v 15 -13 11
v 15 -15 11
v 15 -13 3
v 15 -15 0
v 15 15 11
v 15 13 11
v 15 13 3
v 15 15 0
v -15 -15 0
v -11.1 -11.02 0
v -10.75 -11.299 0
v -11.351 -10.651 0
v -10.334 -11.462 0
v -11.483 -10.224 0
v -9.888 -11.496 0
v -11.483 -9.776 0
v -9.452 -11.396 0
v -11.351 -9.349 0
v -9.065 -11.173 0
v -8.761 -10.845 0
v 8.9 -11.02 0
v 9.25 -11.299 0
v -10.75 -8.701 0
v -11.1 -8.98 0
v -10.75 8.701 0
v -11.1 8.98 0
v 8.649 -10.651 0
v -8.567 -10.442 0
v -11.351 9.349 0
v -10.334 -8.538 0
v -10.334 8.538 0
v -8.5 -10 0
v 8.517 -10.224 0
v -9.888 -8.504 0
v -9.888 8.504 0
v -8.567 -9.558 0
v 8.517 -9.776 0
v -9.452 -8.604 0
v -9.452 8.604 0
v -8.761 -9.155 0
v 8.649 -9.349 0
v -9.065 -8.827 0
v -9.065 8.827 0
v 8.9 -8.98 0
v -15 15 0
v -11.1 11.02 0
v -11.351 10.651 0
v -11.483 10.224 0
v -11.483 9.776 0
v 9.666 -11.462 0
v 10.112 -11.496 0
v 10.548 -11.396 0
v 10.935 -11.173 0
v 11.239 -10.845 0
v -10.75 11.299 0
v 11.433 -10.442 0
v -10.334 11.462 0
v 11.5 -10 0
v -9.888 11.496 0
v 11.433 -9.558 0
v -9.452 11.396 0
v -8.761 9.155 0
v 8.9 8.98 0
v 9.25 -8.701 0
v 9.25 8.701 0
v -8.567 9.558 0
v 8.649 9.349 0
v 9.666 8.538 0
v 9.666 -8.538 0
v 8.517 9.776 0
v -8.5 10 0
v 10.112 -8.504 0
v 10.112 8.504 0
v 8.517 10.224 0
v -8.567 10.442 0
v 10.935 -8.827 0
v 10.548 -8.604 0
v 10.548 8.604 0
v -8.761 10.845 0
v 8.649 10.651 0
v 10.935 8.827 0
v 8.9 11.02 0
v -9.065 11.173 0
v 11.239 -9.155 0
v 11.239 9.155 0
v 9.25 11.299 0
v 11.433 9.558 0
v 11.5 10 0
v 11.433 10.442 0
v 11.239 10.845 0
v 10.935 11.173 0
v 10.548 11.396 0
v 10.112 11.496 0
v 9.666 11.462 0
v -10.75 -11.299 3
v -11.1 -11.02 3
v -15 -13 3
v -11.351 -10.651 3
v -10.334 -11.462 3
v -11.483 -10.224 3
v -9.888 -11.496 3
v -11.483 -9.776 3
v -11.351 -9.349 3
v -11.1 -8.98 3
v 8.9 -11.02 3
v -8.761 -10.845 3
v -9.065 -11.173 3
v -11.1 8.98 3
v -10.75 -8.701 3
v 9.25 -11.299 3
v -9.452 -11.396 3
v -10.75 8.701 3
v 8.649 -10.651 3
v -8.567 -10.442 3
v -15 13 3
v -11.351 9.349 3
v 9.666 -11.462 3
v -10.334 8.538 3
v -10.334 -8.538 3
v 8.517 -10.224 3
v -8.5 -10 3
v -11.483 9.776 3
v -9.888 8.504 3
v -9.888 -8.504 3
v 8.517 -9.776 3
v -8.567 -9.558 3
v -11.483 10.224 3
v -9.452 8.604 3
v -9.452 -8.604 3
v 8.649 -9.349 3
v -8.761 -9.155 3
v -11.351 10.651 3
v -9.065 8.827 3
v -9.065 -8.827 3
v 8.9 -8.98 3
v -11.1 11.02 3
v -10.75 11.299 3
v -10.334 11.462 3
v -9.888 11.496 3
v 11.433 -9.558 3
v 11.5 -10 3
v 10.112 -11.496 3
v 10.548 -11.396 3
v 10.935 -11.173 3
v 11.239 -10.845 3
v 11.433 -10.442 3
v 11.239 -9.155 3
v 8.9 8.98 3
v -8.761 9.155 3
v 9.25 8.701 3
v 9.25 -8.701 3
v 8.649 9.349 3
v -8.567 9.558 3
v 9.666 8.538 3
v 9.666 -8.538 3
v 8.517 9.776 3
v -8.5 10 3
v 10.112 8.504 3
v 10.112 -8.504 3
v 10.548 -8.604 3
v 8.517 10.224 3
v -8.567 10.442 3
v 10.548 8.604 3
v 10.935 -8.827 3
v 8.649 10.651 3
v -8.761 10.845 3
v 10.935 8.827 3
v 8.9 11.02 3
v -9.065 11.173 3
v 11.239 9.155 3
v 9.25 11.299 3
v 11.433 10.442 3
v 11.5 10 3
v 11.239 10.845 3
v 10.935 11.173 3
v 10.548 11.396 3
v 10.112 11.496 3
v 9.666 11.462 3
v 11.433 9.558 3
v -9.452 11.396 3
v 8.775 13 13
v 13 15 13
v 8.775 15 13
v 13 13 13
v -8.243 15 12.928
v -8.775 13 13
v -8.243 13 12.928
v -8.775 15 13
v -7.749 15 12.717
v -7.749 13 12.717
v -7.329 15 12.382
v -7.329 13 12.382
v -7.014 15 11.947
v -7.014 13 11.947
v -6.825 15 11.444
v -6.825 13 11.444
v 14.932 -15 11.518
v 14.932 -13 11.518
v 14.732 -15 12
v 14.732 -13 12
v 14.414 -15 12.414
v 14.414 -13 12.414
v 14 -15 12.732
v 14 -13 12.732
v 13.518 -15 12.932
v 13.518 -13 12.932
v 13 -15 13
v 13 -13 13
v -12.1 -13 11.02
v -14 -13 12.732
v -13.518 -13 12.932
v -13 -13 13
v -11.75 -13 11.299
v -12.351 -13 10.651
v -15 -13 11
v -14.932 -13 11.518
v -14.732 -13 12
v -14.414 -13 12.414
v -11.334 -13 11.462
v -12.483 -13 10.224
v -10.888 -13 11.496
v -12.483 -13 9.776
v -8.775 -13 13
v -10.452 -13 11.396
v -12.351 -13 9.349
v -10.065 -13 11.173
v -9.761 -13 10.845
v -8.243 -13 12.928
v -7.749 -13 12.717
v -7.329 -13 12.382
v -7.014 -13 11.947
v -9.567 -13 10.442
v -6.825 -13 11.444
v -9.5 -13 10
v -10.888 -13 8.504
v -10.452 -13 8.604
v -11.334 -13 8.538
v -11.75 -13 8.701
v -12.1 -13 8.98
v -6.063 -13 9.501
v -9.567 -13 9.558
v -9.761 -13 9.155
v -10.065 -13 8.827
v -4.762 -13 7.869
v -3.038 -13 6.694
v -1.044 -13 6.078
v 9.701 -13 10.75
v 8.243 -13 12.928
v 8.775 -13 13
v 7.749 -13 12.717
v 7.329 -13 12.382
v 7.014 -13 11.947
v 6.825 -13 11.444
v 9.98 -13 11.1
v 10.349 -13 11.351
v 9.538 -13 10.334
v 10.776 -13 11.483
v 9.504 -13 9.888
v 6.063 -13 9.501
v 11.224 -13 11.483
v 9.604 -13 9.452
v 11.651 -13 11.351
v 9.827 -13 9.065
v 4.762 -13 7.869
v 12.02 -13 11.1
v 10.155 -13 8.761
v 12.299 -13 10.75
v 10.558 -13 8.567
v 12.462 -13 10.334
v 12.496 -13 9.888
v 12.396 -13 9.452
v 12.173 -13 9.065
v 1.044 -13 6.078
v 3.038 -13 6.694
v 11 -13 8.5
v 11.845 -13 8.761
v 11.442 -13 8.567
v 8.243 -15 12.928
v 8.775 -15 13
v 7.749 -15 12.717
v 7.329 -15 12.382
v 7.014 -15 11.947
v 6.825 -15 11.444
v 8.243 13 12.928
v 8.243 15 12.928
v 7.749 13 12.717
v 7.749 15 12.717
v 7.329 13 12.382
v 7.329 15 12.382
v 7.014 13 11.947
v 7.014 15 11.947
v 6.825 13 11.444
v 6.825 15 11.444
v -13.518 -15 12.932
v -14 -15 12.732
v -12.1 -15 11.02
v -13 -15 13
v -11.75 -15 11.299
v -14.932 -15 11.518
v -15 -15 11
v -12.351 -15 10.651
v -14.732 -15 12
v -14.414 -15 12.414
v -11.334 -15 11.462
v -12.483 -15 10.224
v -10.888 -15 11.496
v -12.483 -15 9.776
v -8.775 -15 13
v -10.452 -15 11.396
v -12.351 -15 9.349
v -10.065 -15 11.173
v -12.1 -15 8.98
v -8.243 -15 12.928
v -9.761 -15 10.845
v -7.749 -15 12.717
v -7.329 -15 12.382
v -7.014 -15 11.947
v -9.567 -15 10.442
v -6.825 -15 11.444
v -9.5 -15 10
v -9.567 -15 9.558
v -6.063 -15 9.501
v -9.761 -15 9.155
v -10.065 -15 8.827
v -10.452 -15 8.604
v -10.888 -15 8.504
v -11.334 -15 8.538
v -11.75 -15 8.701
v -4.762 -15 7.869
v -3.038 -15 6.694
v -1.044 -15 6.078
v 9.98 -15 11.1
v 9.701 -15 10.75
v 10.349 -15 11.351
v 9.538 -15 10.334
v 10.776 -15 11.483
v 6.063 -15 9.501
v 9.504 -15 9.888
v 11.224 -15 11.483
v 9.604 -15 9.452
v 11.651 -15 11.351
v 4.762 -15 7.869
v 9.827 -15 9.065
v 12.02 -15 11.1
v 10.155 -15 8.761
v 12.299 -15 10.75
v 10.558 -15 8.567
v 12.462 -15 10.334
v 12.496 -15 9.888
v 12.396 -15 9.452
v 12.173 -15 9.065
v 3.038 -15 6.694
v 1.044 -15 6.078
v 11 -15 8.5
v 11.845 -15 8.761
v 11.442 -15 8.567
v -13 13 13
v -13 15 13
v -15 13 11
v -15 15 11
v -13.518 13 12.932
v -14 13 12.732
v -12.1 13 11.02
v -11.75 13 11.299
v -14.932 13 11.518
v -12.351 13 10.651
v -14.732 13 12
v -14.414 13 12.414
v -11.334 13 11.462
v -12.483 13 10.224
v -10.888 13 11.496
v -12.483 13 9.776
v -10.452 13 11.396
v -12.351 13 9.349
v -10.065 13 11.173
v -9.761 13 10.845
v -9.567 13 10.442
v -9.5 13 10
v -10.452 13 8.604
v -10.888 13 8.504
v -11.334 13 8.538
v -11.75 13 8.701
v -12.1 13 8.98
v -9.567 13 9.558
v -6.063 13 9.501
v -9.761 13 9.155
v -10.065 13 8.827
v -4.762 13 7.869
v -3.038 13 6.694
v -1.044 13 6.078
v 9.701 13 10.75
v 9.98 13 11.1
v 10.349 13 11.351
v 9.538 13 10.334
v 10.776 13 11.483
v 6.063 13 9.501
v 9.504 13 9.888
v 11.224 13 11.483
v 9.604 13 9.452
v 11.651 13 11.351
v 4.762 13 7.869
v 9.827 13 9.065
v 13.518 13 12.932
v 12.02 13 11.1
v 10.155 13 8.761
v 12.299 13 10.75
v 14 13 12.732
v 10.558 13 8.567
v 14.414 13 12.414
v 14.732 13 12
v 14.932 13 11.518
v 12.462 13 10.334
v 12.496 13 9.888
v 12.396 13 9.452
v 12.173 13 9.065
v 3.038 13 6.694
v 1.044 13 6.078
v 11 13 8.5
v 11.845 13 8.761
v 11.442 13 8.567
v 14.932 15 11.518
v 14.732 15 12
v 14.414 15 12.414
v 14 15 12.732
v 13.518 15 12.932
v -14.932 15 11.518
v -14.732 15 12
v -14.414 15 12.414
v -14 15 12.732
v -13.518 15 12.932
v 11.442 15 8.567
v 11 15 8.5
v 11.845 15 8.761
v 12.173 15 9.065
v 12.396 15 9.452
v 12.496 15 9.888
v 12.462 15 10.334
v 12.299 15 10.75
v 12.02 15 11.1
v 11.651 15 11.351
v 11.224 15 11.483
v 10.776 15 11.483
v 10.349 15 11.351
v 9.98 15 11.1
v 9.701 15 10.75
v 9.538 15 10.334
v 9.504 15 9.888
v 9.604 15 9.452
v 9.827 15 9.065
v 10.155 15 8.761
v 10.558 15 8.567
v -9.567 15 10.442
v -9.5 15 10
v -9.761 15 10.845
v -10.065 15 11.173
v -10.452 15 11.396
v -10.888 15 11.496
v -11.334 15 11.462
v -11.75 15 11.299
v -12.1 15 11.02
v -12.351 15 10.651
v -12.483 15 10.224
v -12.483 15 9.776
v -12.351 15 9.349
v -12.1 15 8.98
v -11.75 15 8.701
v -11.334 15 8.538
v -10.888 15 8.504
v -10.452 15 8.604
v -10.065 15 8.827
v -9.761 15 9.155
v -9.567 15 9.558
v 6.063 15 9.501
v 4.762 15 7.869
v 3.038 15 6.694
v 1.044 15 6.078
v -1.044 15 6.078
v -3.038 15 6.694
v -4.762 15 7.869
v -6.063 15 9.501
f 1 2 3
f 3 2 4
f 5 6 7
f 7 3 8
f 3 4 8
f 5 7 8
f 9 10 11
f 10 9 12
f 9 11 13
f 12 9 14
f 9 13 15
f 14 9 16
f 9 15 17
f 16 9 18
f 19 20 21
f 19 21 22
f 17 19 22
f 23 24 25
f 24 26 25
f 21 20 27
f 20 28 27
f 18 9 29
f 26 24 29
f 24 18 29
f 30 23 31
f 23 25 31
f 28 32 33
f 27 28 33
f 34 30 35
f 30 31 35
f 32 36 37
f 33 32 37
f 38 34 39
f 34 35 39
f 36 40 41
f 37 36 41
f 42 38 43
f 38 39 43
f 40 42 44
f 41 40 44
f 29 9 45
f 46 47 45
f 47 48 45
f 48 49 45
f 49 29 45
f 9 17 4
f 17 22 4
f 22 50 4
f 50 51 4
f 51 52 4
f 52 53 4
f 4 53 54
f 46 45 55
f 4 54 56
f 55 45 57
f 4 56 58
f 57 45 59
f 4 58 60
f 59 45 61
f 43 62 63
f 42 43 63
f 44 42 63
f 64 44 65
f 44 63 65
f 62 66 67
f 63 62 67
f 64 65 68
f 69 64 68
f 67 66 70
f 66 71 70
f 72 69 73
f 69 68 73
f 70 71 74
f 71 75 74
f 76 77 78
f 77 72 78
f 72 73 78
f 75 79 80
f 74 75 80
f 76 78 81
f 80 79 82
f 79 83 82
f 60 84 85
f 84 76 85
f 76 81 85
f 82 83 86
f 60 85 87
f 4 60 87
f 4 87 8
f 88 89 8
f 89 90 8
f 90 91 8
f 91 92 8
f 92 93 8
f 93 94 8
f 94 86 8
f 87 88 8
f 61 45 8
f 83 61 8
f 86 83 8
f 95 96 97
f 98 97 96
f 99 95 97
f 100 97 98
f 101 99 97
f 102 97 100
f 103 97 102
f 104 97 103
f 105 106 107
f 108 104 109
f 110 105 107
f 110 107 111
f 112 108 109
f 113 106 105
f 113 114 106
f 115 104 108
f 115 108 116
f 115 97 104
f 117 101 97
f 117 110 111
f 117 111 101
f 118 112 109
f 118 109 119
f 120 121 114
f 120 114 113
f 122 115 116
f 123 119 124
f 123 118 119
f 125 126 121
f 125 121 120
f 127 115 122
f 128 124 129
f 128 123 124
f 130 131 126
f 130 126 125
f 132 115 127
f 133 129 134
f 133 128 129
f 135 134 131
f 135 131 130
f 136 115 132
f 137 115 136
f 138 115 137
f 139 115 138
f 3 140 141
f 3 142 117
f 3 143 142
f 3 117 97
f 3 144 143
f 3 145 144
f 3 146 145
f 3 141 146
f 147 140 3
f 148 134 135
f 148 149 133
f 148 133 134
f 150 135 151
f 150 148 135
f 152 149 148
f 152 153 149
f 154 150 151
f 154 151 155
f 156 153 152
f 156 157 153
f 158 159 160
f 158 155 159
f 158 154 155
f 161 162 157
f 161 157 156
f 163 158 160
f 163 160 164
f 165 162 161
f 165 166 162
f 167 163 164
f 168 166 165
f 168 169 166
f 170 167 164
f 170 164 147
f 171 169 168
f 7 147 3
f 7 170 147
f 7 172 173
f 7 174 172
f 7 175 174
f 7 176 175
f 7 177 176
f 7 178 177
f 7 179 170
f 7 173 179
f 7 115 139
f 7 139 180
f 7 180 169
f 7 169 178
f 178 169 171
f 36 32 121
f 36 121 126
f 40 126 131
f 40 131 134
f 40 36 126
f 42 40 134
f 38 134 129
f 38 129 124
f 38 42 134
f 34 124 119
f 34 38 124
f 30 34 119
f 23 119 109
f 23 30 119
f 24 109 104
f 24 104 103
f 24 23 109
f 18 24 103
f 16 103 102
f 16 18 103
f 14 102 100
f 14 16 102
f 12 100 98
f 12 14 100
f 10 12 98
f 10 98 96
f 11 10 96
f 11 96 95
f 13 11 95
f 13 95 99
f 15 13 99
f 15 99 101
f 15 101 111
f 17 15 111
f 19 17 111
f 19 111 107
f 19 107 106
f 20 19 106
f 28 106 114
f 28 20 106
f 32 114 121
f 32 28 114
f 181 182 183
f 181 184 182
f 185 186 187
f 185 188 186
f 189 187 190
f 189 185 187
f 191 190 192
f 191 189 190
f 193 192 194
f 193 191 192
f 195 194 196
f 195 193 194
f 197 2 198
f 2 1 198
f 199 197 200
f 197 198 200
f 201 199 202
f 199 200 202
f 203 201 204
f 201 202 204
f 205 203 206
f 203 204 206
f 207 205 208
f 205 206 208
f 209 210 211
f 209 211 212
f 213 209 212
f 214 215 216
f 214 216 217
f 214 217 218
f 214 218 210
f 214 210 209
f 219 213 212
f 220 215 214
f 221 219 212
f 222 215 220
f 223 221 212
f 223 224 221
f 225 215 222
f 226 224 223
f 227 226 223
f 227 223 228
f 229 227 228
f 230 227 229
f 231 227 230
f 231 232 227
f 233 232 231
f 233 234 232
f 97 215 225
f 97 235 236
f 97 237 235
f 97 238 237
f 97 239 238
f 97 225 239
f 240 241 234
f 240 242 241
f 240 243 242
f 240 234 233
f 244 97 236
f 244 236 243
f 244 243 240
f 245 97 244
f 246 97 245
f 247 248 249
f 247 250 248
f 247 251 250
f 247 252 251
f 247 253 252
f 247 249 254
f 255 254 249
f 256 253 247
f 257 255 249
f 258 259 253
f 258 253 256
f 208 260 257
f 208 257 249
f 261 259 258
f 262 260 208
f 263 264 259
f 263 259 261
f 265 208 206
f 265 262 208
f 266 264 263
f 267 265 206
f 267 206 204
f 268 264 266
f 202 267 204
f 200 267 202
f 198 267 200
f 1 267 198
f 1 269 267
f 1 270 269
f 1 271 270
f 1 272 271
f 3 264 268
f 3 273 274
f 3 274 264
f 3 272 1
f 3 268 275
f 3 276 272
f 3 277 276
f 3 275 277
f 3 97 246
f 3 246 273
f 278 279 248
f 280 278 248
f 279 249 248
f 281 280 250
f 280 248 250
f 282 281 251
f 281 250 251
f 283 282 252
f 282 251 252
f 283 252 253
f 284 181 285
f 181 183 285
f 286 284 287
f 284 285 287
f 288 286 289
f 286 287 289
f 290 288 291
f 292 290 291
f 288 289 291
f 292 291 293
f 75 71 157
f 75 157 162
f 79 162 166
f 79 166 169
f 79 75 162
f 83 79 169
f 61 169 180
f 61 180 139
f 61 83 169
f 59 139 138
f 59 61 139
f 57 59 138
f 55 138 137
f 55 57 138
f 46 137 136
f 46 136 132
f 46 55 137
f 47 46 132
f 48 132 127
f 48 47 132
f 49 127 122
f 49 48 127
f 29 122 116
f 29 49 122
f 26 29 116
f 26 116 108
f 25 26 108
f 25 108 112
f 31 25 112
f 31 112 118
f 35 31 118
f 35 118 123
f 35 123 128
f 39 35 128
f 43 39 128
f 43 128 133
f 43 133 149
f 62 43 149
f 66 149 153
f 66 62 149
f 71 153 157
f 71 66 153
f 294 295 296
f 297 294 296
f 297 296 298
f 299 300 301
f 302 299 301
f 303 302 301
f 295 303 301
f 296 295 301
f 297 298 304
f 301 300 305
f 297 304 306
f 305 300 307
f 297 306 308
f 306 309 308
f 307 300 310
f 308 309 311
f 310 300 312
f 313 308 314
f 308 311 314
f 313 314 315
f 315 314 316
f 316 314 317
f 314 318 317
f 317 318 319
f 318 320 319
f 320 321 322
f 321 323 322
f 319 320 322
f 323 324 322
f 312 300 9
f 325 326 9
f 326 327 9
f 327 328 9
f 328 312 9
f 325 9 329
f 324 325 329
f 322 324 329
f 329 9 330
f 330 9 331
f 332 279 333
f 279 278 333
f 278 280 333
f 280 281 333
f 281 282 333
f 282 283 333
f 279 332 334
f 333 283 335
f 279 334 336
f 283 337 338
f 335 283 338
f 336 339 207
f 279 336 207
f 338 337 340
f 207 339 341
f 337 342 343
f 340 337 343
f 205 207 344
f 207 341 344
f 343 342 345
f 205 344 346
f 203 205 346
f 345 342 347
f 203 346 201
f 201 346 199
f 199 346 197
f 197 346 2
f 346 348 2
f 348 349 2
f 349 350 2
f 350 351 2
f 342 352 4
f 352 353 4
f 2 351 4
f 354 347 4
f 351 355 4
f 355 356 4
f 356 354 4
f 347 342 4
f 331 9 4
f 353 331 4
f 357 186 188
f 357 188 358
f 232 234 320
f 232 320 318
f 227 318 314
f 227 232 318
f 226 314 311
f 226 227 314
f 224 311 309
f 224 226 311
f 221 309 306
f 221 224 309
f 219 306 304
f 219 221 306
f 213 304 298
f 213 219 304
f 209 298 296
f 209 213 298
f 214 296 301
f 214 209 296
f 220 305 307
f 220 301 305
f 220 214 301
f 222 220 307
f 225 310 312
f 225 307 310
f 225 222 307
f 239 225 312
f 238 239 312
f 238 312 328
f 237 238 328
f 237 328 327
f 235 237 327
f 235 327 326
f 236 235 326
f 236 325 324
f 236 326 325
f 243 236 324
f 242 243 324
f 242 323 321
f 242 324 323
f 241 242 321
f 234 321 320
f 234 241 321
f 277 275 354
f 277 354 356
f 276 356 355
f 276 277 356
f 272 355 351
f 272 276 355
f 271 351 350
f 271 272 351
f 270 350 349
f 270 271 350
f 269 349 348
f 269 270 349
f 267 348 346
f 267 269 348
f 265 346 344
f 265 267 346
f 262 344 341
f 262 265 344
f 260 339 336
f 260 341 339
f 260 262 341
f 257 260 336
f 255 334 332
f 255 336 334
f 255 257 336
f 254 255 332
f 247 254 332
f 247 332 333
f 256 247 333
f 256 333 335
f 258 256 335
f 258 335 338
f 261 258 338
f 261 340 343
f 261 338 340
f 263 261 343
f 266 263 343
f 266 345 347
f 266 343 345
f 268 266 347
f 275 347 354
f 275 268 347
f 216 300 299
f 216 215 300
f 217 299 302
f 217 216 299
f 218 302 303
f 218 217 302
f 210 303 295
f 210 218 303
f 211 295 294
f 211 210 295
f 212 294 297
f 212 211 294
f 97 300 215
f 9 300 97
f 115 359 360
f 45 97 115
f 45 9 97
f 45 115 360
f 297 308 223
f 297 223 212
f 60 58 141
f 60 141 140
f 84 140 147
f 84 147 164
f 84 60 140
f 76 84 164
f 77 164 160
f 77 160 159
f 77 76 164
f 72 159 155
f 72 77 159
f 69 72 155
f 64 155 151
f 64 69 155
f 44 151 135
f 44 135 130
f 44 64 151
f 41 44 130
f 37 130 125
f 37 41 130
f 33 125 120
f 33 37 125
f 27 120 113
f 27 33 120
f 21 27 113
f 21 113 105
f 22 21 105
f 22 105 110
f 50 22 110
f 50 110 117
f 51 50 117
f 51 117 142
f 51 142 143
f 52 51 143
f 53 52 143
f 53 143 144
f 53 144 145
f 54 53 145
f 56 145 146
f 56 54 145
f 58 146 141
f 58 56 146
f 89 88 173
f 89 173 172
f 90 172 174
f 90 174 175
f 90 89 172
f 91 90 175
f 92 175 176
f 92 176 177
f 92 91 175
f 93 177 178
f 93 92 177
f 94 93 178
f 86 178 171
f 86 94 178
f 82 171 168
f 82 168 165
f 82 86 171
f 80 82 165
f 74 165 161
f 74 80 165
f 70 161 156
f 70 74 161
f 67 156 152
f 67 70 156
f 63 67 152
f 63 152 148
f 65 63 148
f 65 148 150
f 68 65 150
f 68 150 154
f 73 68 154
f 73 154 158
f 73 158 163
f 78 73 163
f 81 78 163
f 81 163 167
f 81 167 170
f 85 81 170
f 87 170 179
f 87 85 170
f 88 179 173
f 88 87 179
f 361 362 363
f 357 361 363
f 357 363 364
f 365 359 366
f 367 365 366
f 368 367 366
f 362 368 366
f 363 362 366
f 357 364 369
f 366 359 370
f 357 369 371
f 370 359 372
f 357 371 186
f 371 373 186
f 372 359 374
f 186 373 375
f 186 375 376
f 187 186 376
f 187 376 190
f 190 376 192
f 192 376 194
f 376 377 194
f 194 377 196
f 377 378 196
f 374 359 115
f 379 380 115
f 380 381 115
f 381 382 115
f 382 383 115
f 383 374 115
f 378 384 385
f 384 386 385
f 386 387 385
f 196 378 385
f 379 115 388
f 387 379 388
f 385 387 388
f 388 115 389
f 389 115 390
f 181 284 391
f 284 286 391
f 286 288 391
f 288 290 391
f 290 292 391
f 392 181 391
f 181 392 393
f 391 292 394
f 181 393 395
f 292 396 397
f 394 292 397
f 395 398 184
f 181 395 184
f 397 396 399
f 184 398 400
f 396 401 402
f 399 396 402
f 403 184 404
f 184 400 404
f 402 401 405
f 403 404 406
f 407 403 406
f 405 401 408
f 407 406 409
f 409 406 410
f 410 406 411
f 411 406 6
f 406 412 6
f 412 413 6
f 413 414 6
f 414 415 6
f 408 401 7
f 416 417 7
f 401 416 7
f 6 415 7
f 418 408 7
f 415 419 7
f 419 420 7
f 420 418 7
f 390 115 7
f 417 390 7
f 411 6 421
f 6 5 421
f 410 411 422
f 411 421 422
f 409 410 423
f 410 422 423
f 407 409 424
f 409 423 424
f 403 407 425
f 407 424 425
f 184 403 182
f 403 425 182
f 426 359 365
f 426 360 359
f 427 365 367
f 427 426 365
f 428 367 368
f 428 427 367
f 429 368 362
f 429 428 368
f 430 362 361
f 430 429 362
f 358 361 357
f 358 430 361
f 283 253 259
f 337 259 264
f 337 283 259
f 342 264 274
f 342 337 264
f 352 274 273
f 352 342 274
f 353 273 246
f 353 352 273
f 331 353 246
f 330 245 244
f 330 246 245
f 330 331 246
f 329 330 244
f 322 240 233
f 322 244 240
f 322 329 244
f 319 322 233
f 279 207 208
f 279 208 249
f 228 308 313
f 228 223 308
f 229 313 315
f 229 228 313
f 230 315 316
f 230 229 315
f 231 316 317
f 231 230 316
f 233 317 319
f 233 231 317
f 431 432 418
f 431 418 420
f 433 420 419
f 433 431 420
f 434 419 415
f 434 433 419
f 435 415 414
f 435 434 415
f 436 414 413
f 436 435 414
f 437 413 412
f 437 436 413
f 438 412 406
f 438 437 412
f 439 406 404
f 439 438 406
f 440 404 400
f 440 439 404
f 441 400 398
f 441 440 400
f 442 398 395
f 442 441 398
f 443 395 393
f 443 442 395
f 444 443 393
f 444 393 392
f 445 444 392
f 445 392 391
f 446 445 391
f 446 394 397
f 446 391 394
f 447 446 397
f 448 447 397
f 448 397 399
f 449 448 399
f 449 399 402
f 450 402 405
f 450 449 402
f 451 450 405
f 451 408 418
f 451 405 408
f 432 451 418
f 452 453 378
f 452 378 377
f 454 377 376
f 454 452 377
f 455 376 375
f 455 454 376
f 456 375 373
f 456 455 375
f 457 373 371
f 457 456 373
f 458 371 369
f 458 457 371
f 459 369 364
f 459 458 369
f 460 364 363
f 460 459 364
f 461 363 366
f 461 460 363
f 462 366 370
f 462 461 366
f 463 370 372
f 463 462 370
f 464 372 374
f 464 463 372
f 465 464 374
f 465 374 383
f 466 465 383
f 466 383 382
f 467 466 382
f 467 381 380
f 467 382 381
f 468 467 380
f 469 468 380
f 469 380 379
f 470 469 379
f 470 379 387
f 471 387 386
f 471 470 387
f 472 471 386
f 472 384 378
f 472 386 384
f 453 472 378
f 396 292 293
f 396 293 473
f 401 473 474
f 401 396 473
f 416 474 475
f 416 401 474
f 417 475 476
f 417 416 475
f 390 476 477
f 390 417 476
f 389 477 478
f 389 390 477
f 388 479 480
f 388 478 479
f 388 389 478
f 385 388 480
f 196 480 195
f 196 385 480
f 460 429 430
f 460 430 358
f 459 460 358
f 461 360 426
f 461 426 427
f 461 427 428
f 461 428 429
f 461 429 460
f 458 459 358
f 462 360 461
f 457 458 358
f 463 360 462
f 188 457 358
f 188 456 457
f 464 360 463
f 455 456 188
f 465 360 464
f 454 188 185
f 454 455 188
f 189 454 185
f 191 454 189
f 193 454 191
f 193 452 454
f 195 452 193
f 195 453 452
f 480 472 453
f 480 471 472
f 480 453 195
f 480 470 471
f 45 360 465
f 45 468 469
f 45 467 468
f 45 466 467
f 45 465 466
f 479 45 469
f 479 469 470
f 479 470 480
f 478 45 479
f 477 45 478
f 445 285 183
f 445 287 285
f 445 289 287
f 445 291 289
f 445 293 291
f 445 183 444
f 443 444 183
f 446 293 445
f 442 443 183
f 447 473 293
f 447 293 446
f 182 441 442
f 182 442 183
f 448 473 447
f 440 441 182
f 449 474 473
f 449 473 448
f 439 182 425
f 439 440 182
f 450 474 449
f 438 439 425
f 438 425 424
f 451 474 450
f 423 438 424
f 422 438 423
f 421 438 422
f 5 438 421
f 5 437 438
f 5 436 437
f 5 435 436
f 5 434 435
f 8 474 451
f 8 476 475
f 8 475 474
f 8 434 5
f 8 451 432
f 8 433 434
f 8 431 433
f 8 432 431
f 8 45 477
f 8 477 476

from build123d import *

# Parameters (mm, degrees)
SKETCH_1_W               = 30
SKETCH_1_H               = 30
SKETCH_1_R               = 1.5
EXTRUDE_1_DEPTH          = 3
SKETCH_2_W               = 30
SKETCH_2_H               = 2
EXTRUDE_2_DEPTH          = 18
CUT_EXTRUDE_1_DEPTH      = 39.078865529
CUT_EXTRUDE_1_DEPTH_BACK = 39.078865529
SKETCH_3_R               = 1.5
CUT_EXTRUDE_2_DEPTH      = 40.572717875
FILLET_1_R               = 2


with BuildPart() as part:
    # 草图1 → 凸台-拉伸1 (new body)
    with BuildSketch(Plane.XY):
        Rectangle(SKETCH_1_W, SKETCH_1_H)
        with Locations((-10, 10)):
            Circle(SKETCH_1_R, mode=Mode.SUBTRACT)
        with Locations((10, 10)):
            Circle(SKETCH_1_R, mode=Mode.SUBTRACT)
        with Locations((-10, -10)):
            Circle(SKETCH_1_R, mode=Mode.SUBTRACT)
        with Locations((10, -10)):
            Circle(SKETCH_1_R, mode=Mode.SUBTRACT)
    extrude(amount=EXTRUDE_1_DEPTH)

    # 草图2 → 凸台-拉伸2 (add)
    with BuildSketch(Plane.XY.offset(3)):
        with Locations((0, 14)):
            Rectangle(SKETCH_2_W, SKETCH_2_H)
        with Locations((0, -14)):
            Rectangle(SKETCH_2_W, SKETCH_2_H)
    extrude(amount=EXTRUDE_2_DEPTH)

    # 草图3 → 切除-拉伸1 (cut, two sides: drawn at the far end of the back side and taken through both)
    with BuildSketch(Plane.XZ.offset(-13).offset(-CUT_EXTRUDE_1_DEPTH_BACK)):
        with Locations((-11, 10)):
            Circle(SKETCH_3_R)
        with Locations(Location((11, 10, 0), (0, 0, 270))):
            Circle(SKETCH_3_R)
    extrude(amount=CUT_EXTRUDE_1_DEPTH + CUT_EXTRUDE_1_DEPTH_BACK, mode=Mode.SUBTRACT)

    # 草图4 → 切除-拉伸2 (cut, through all)
    with BuildSketch(Plane.XZ.offset(15)):
        with BuildLine():
            Line((-7, 13), (-16.491106969, 13))
            Line((-16.491106969, 13), (-16.491106969, 22.234658659))
            Line((-16.491106969, 22.234658659), (16.365937277, 22.234658659))
            Line((16.365937277, 22.234658659), (16.365937277, 13))
            Line((16.365937277, 13), (7, 13))
            ThreePointArc((7, 13), (0, 6), (-7, 13))
        make_face()
    extrude(amount=-CUT_EXTRUDE_2_DEPTH, mode=Mode.SUBTRACT)

    # 圆角1
    fillet_1_edges = [part.edges().sort_by_distance(p)[0] for p in [
        (7, 14, 13),
        (7, -14, 13),
        (-15, 14, 13),
        (-7, 14, 13),
        (-15, -14, 13),
        (-7, -14, 13),
        (15, 14, 13),
        (15, -14, 13),
    ]]
    fillet(fillet_1_edges, radius=FILLET_1_R)


solid = part.part
